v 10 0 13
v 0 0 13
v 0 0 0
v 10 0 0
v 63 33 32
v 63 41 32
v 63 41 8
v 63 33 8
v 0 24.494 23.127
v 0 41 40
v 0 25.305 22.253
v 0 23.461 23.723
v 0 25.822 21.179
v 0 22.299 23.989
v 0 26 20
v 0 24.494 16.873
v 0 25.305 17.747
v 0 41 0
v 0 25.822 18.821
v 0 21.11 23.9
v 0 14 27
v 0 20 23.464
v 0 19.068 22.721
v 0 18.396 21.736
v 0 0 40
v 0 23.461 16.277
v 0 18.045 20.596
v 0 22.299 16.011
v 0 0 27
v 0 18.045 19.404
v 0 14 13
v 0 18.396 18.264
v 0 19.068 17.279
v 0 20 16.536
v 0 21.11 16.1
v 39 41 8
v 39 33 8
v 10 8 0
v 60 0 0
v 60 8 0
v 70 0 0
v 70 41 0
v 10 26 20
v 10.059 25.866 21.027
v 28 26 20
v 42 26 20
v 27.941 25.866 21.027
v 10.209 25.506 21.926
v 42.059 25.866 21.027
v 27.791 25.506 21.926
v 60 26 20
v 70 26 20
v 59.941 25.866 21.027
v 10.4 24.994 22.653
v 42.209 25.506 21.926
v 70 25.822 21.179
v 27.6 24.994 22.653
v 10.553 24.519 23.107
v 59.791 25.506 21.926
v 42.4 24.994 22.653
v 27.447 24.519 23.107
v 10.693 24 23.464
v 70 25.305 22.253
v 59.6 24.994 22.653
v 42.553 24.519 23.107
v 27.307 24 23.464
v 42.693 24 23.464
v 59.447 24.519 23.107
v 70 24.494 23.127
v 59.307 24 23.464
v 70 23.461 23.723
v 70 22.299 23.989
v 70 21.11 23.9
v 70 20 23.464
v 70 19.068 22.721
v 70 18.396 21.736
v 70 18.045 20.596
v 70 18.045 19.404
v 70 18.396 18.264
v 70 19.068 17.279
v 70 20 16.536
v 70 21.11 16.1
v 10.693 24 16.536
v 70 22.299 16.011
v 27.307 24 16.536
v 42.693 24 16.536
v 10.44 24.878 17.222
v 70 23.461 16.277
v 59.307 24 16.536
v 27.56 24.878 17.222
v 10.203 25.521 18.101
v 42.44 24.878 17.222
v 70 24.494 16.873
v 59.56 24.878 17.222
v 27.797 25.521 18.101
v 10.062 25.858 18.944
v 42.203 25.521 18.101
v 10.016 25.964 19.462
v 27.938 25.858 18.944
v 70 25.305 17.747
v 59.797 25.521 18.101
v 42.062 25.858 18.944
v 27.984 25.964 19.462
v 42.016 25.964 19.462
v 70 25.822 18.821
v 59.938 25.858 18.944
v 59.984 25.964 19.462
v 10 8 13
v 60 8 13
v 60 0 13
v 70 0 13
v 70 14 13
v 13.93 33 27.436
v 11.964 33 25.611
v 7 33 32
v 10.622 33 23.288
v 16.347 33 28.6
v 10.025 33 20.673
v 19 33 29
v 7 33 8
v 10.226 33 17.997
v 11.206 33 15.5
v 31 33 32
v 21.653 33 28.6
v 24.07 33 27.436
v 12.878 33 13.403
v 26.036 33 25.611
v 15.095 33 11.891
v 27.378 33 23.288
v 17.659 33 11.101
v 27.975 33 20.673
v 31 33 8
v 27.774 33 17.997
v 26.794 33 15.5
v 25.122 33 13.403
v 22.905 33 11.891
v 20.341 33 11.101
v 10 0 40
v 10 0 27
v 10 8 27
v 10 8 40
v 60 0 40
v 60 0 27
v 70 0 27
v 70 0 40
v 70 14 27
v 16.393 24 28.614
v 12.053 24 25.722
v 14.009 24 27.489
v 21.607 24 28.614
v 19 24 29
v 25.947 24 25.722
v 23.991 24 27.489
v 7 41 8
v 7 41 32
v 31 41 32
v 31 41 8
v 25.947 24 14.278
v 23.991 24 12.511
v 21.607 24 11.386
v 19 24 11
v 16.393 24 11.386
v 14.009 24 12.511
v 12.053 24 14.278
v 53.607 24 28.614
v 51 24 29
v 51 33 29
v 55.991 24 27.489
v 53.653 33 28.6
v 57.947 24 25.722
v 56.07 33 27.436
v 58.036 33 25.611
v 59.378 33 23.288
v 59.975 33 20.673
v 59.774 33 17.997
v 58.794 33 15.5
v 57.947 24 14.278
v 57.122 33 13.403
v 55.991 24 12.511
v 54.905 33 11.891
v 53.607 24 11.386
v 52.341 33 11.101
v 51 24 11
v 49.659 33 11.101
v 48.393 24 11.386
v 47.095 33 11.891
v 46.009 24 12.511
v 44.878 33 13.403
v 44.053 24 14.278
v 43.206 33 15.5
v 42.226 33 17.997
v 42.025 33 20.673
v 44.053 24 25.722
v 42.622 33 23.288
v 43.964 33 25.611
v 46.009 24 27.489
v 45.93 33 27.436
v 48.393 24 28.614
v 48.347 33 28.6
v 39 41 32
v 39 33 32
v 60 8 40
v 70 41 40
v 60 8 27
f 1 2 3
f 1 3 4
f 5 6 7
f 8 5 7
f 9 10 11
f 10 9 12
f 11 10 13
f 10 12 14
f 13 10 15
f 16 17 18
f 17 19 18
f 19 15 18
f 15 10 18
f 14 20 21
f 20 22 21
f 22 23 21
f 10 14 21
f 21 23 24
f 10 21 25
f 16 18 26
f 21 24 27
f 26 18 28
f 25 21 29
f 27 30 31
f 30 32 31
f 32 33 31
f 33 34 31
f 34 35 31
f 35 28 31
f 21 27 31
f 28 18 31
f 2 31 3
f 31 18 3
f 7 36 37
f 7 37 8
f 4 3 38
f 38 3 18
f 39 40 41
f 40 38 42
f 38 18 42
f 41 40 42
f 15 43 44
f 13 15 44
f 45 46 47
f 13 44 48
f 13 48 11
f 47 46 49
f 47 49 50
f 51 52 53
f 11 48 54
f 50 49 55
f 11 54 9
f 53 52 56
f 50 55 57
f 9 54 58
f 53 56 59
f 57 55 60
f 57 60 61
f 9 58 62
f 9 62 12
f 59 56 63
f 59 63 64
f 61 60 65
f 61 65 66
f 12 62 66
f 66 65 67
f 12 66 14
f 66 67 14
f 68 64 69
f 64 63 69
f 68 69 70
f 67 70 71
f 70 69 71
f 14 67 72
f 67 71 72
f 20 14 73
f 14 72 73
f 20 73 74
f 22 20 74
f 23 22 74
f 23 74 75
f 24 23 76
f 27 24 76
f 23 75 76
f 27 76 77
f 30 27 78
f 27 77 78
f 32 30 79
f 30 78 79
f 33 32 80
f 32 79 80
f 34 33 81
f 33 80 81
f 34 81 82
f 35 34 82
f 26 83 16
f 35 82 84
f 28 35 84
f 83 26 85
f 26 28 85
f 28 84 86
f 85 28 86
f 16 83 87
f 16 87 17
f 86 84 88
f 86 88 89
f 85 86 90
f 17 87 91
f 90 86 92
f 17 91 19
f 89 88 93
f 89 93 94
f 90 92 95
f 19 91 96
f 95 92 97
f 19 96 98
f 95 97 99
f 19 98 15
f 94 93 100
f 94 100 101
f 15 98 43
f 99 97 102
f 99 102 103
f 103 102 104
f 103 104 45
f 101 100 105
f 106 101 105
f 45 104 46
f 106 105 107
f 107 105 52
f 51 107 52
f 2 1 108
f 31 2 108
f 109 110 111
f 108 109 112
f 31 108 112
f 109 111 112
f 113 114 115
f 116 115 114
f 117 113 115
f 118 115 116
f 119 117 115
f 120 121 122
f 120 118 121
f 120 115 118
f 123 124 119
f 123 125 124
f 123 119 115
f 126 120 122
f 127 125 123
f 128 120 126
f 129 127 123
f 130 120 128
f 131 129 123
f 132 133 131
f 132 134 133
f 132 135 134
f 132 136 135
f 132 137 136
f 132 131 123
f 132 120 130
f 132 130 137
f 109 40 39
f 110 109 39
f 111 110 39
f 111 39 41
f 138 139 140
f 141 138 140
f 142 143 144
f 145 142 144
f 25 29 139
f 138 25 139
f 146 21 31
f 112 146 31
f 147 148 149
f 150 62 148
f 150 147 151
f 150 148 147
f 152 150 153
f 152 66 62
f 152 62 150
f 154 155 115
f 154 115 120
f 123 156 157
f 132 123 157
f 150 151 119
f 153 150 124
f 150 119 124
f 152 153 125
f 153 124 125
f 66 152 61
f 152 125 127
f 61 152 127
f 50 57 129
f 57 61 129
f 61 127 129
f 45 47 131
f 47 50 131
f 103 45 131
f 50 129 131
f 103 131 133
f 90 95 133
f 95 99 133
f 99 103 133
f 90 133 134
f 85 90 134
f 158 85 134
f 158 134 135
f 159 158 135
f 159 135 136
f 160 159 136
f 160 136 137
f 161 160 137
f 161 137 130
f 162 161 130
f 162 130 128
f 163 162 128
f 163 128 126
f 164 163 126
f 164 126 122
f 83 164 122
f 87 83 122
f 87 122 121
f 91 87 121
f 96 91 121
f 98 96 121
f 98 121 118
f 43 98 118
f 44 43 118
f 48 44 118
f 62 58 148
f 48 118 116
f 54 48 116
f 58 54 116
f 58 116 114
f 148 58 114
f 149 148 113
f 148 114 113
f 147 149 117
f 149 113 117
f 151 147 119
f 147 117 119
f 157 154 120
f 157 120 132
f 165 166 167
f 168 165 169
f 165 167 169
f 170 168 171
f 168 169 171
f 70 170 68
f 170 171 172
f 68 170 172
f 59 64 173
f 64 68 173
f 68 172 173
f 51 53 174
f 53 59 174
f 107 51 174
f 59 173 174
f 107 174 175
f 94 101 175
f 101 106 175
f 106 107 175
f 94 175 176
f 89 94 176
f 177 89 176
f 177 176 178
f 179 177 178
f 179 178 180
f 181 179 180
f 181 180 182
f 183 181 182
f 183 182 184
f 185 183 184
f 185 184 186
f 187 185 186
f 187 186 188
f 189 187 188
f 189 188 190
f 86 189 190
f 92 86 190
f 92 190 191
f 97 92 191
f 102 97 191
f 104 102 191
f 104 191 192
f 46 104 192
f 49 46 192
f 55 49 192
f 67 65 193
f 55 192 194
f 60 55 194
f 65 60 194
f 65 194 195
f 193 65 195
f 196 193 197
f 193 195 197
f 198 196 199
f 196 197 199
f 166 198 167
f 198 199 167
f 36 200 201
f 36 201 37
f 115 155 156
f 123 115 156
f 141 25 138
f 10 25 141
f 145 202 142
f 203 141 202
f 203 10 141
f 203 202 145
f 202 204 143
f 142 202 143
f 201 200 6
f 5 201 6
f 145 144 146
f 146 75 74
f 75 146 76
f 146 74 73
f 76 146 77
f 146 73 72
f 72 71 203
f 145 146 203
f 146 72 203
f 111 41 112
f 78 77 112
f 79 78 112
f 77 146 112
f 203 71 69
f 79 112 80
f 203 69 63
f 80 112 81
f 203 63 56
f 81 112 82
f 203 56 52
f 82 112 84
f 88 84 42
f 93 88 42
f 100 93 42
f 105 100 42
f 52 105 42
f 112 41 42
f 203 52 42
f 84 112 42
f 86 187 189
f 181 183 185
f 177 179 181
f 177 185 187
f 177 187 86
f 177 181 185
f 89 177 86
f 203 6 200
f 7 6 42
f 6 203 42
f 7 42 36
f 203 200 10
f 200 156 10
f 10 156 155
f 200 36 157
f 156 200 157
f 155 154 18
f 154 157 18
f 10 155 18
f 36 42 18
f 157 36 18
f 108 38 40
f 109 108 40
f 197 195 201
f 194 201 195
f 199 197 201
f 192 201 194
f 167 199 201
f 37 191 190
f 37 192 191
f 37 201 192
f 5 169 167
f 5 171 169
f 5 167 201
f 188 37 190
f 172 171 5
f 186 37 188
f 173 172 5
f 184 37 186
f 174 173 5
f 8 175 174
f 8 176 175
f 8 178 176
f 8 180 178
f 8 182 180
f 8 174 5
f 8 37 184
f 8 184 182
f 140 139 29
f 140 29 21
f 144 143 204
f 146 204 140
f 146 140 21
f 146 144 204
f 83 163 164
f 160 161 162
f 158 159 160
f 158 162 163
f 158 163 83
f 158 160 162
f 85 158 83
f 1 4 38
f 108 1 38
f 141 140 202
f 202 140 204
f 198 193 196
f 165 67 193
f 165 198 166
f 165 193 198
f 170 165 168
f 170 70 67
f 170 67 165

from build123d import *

# Parameters (mm, degrees)
BOSS_EXTRUDE3_DEPTH = 40
SKETCH7_W           = 14
SKETCH7_H           = 14
CUT_EXTRUDE3_DEPTH  = 108
SKETCH8_R           = 4
CUT_EXTRUDE4_DEPTH  = 108
SKETCH9_W           = 24
SKETCH9_H           = 24
CUT_EXTRUDE5_DEPTH  = 8
SKETCH10_R          = 9
CUT_EXTRUDE6_DEPTH  = 9
SKETCH11_R          = 9
CUT_EXTRUDE7_DEPTH  = 9


with BuildPart() as part:
    # Sketch1 → Boss-Extrude3 (new body)
    with BuildSketch(Plane.XY):
        Polygon((10, 0), (10, 8), (60, 8), (60, 0), (70, 0), (70, 41), (0, 41), (0, 0), align=None)
    extrude(amount=BOSS_EXTRUDE3_DEPTH)

    # Sketch7 → Cut-Extrude3 (cut)
    with BuildSketch(Plane(origin=(70, 0, 0), x_dir=(0, 0, -1), z_dir=(1, 0, 0))):
        with Locations((-20, 7)):
            Rectangle(SKETCH7_W, SKETCH7_H)
    extrude(amount=-CUT_EXTRUDE3_DEPTH, mode=Mode.SUBTRACT)

    # Sketch8 → Cut-Extrude4 (cut)
    with BuildSketch(Plane(origin=(70, 0, 0), x_dir=(0, 0, -1), z_dir=(1, 0, 0))):
        with Locations(Location((-20, 22, 0), (0, 0, 90))):
            Circle(SKETCH8_R)
    extrude(amount=-CUT_EXTRUDE4_DEPTH, mode=Mode.SUBTRACT)

    # Sketch9 → Cut-Extrude5 (cut)
    with BuildSketch(Plane(origin=(0, 41, 0), x_dir=(1, 0, 0), z_dir=(0, 1, 0))):
        with Locations((19, -20)):
            Rectangle(SKETCH9_W, SKETCH9_H)
        with Locations((51, -20)):
            Rectangle(SKETCH9_W, SKETCH9_H)
    extrude(amount=-CUT_EXTRUDE5_DEPTH, mode=Mode.SUBTRACT)

    # Sketch10 → Cut-Extrude6 (cut)
    with BuildSketch(Plane(origin=(0, 33, 0), x_dir=(1, 0, 0), z_dir=(0, 1, 0))):
        with Locations(Location((19, -20, 0), (0, 0, 270))):
            Circle(SKETCH10_R)
    extrude(amount=-CUT_EXTRUDE6_DEPTH, mode=Mode.SUBTRACT)

    # Sketch11 → Cut-Extrude7 (cut)
    with BuildSketch(Plane(origin=(0, 33, 0), x_dir=(1, 0, 0), z_dir=(0, 1, 0))):
        with Locations(Location((51, -20, 0), (0, 0, 270))):
            Circle(SKETCH11_R)
    extrude(amount=-CUT_EXTRUDE7_DEPTH, mode=Mode.SUBTRACT)


solid = part.part
